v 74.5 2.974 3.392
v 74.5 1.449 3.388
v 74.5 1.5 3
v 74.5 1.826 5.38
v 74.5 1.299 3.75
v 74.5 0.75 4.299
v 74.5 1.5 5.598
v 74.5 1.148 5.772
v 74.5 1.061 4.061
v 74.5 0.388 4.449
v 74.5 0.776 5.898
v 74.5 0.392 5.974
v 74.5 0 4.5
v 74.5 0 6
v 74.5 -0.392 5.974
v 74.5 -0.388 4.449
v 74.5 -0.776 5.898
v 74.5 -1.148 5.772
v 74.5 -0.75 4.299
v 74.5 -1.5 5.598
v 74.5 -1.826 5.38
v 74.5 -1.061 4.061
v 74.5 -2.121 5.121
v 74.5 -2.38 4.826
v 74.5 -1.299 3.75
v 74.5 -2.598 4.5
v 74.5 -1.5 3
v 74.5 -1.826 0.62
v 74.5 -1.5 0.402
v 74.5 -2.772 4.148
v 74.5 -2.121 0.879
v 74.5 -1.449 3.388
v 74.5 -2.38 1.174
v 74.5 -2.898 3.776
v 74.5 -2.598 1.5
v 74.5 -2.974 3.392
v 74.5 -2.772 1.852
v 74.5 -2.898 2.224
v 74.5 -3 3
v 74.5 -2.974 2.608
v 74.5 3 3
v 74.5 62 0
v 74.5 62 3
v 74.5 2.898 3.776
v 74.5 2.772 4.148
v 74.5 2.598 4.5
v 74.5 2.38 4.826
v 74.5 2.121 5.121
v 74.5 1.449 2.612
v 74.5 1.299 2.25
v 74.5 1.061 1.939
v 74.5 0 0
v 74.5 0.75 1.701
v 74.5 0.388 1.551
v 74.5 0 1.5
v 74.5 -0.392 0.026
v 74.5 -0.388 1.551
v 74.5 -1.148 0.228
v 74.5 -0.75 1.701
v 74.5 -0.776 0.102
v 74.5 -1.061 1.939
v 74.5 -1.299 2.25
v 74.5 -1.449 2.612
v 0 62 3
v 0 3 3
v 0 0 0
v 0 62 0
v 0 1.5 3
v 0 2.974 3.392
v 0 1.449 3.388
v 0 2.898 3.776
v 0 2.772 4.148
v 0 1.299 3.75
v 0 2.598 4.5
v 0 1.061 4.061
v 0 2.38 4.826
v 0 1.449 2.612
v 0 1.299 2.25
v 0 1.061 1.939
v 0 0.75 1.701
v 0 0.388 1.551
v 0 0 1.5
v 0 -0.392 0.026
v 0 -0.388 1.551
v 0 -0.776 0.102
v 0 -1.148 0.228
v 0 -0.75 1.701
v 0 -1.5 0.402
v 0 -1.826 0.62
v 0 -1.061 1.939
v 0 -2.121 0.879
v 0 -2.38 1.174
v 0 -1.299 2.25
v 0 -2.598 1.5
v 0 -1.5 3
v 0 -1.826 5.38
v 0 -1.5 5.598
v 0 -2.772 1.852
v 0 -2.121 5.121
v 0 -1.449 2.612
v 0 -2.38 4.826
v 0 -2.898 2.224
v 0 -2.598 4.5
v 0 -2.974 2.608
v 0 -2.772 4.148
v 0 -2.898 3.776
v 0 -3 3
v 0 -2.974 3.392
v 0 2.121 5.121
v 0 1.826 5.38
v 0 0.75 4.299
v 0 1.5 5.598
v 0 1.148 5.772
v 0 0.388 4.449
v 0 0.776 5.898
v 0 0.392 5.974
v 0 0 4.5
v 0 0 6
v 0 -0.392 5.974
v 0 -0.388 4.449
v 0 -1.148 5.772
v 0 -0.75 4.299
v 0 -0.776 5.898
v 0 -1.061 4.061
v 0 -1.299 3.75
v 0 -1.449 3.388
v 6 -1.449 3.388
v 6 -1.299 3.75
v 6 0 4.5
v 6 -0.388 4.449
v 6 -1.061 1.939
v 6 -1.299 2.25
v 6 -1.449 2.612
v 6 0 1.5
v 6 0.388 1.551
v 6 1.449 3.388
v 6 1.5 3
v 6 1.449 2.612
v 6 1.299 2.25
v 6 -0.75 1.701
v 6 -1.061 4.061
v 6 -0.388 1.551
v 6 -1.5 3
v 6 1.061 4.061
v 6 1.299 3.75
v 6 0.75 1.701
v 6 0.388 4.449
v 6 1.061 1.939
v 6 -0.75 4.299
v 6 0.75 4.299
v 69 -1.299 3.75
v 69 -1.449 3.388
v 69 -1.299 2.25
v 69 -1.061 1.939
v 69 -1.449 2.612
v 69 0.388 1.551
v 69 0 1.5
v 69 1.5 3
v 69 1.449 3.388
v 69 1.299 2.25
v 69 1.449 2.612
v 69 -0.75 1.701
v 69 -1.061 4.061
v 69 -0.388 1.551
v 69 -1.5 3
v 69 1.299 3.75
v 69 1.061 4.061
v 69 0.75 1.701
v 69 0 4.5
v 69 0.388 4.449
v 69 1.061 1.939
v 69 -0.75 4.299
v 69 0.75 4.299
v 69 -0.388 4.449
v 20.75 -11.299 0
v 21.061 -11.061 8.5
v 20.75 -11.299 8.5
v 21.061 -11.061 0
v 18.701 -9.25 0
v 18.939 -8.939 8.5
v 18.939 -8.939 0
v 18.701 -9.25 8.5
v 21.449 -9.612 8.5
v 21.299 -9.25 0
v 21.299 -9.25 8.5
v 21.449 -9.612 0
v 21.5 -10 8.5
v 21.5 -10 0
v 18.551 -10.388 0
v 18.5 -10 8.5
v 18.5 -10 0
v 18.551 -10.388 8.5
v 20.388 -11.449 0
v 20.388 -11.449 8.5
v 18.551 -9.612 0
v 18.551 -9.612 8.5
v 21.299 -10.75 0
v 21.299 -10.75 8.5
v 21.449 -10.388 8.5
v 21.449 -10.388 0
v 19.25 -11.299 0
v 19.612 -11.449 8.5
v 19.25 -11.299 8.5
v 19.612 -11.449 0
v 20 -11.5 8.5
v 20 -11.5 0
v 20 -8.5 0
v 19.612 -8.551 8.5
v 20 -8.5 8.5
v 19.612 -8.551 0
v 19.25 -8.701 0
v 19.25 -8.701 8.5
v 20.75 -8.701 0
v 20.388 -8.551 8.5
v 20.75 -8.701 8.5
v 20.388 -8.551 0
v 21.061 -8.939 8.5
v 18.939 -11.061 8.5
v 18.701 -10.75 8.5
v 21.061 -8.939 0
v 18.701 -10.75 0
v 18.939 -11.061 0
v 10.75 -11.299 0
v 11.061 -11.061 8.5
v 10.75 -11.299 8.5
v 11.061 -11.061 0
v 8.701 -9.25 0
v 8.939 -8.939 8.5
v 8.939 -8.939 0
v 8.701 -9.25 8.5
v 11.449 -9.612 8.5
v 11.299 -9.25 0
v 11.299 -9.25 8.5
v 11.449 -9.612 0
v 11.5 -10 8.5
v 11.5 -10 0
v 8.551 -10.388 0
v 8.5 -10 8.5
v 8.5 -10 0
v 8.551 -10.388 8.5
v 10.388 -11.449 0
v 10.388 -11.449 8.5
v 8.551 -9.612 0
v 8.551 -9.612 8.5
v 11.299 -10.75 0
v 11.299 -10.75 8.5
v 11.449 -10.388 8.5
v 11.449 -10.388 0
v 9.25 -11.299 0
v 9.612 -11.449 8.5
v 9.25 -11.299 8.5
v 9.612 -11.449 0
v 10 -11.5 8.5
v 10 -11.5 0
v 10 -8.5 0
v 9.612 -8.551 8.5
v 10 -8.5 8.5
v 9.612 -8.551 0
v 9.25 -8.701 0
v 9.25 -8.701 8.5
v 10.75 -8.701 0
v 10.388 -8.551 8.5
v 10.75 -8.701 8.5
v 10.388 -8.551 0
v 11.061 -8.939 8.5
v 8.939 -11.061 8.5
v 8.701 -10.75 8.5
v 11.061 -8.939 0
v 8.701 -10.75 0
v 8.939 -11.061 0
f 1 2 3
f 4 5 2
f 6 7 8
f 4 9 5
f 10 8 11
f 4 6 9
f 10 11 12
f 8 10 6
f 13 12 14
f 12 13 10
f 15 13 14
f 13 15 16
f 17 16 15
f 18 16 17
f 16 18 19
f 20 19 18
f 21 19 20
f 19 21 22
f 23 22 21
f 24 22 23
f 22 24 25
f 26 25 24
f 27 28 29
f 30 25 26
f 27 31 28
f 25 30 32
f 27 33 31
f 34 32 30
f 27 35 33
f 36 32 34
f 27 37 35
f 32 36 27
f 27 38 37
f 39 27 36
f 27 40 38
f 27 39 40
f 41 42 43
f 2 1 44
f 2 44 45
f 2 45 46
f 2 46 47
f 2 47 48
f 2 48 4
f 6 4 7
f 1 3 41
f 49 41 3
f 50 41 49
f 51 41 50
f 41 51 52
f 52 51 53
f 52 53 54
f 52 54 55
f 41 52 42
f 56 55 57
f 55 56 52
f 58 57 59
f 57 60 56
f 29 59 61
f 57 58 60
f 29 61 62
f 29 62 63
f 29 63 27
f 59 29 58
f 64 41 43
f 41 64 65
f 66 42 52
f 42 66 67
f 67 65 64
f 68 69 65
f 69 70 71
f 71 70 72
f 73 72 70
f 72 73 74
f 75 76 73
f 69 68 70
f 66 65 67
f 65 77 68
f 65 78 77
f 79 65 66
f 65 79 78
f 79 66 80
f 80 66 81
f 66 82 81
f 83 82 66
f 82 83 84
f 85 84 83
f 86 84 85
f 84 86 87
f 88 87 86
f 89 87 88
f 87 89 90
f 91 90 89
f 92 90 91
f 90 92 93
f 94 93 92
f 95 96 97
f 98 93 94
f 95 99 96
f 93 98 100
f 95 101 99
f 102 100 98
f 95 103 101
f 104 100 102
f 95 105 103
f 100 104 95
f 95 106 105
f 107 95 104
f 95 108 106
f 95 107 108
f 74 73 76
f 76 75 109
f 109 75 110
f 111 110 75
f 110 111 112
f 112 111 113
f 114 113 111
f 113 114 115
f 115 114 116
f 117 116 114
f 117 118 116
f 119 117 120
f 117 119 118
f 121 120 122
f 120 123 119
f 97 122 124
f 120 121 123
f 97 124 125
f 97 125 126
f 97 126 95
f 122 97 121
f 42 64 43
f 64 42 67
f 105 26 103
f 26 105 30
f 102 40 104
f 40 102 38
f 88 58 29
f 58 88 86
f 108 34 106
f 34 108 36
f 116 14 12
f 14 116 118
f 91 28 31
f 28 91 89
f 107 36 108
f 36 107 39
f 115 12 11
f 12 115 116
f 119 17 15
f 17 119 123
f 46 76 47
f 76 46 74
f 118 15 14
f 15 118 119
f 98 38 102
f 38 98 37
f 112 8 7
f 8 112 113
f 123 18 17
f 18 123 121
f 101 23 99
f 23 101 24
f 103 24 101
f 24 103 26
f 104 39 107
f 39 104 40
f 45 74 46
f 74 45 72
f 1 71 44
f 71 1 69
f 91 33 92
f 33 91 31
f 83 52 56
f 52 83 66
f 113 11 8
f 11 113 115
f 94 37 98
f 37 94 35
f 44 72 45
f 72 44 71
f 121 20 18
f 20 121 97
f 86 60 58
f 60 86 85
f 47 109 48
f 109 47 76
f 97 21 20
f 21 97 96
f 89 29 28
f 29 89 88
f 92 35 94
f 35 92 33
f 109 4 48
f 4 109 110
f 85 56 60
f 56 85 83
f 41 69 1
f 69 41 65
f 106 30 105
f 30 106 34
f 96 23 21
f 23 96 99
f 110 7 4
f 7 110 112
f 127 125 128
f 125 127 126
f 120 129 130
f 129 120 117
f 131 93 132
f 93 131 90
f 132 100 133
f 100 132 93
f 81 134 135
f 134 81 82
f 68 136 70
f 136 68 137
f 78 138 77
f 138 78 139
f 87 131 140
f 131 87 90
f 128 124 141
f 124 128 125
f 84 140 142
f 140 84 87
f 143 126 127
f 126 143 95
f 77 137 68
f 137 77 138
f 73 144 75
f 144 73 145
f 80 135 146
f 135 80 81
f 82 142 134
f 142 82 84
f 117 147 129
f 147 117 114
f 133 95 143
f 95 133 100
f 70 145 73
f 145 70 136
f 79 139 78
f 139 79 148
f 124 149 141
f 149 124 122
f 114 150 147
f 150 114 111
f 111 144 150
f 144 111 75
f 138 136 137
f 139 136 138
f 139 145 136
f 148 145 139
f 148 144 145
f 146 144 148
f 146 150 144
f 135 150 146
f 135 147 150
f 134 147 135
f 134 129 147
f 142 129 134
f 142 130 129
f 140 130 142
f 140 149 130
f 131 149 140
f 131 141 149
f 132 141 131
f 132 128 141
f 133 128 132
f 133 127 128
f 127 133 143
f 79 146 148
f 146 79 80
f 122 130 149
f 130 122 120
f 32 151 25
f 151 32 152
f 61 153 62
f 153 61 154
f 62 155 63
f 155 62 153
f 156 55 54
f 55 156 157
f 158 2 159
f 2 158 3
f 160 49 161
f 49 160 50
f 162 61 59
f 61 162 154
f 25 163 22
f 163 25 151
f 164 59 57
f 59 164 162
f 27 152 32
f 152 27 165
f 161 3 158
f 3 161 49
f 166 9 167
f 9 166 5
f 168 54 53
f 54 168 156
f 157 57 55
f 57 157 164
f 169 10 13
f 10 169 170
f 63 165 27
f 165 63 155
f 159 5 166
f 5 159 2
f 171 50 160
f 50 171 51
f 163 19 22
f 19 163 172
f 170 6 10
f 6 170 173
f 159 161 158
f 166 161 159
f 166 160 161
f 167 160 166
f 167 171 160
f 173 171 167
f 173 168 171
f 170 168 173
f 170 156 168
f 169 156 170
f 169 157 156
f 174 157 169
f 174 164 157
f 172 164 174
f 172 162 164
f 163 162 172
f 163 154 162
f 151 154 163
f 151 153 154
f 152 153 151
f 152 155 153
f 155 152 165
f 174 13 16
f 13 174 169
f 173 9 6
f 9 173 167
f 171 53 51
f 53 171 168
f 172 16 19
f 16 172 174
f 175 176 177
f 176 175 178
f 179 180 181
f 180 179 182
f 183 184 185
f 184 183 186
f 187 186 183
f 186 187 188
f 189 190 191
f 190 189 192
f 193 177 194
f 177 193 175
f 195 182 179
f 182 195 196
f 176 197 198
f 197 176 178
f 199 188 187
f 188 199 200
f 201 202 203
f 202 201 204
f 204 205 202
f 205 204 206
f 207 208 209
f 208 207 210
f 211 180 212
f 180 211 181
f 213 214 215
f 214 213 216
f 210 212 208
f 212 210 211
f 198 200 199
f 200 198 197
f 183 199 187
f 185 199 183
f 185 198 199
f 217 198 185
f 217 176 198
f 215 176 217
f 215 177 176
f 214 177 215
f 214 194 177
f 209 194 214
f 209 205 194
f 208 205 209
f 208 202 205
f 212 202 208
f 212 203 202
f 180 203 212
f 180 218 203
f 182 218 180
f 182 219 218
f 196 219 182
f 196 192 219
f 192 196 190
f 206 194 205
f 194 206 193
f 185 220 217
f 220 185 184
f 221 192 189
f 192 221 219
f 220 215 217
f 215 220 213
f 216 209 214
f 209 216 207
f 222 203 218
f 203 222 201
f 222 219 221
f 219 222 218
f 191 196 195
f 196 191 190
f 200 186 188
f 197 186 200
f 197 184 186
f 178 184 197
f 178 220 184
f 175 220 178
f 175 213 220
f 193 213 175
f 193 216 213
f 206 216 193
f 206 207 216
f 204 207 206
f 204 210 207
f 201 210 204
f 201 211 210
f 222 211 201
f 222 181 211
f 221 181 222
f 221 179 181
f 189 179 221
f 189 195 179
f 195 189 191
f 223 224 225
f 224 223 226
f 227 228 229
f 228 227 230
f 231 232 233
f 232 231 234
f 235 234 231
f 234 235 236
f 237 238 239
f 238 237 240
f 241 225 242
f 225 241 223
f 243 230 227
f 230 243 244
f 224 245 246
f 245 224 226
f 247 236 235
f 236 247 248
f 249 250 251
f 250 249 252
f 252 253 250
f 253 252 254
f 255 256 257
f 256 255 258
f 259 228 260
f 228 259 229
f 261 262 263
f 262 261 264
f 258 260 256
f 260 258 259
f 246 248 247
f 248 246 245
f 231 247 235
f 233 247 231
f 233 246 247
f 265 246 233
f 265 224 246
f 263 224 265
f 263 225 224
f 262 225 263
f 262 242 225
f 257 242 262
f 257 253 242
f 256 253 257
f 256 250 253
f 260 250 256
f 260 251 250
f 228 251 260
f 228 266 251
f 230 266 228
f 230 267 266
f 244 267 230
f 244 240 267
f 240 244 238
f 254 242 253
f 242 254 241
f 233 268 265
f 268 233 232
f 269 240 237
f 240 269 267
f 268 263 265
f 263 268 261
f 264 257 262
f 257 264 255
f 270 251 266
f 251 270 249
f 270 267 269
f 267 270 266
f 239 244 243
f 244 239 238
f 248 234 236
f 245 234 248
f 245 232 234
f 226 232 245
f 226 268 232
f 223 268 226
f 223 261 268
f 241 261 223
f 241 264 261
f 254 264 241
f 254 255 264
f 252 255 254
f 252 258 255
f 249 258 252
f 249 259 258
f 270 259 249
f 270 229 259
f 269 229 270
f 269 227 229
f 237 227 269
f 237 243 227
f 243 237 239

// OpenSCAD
width = 75;
length = 60;

difference() {
union(){
cube([width - 0.5, length+2, 3]);
translate([0,0,3]) rotate([0,90,0]) cylinder(h=width - 0.5, r=3);
}
translate([0,0,3]) rotate([0,90,0]) cylinder(h=6, r=1.5);
translate([width-6,0, 3]) rotate([0,90,0]) cylinder(h=6, r=1.5);
}

translate([20, -10, 0]) cylinder(h=8.5, r=1.5);
translate([10, -10, 0]) cylinder(h=8.5, r=1.5);

$fa = 1;
$fs = 0.4;
